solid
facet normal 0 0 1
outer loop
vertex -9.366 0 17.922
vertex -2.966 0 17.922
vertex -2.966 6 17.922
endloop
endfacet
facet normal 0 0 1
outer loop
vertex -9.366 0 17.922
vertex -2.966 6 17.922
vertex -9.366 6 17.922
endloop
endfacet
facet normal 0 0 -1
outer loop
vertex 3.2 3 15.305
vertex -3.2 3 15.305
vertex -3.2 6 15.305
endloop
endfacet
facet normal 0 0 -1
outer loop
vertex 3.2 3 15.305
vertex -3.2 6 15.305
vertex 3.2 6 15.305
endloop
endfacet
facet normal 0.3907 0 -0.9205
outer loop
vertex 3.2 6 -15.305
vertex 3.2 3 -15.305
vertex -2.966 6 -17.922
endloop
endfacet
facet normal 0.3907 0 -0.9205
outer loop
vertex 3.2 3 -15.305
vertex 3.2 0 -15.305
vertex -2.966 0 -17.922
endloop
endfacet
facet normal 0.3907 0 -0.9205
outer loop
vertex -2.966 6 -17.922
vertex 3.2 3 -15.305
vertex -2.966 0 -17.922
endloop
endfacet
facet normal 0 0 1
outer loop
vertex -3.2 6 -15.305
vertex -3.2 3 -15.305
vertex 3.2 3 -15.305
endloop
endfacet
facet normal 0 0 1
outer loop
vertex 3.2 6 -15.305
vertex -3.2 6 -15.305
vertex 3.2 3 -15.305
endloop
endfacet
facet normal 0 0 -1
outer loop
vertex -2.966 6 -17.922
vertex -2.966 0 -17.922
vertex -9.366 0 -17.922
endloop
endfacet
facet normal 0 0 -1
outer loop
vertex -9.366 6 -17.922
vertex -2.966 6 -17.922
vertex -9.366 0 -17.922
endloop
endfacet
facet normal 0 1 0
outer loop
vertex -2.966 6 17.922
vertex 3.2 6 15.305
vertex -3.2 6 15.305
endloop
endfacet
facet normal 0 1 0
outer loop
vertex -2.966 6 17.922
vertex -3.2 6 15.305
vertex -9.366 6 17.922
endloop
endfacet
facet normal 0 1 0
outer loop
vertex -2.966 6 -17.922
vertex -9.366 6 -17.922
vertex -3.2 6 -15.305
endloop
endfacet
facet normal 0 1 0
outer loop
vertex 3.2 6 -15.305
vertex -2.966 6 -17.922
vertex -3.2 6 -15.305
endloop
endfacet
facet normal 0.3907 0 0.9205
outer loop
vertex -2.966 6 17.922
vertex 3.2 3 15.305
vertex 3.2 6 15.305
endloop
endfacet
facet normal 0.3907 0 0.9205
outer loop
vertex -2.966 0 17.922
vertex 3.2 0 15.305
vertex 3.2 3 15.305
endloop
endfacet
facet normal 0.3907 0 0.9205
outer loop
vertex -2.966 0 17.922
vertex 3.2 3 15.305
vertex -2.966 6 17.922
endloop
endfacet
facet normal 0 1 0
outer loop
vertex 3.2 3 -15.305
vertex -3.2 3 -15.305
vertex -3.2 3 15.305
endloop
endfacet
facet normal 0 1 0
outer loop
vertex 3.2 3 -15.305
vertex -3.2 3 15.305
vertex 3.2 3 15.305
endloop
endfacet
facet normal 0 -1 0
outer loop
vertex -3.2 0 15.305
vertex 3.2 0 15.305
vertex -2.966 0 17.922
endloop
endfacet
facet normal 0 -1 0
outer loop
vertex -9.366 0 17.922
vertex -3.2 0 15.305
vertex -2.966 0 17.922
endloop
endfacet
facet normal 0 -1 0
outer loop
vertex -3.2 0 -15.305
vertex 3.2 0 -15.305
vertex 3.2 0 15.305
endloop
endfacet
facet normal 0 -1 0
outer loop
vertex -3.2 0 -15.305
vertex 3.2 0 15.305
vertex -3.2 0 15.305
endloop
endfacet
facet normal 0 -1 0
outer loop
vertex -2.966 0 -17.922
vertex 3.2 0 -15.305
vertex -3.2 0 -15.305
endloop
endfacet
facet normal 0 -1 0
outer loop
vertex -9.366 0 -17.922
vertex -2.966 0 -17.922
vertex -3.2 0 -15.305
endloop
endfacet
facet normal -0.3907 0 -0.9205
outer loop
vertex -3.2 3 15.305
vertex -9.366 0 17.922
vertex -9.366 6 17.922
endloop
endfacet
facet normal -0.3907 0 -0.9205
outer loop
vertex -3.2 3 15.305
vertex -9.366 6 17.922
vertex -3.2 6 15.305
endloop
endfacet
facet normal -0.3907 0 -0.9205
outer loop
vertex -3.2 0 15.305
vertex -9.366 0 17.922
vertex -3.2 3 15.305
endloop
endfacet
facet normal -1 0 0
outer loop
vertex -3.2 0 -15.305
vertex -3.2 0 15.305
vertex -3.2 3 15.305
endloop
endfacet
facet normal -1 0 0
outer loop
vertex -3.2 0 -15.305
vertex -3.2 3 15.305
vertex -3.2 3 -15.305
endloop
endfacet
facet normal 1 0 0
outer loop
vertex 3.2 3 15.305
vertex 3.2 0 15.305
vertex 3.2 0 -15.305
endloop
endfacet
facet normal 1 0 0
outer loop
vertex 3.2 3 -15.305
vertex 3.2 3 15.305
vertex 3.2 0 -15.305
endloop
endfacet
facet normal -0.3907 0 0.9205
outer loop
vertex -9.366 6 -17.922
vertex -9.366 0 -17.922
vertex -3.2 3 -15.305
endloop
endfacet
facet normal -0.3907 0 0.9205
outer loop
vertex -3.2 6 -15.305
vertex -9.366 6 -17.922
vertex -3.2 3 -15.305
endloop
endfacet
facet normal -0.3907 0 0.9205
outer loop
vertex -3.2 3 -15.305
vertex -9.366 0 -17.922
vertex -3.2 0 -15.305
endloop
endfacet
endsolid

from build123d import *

# Parameters (mm, degrees)
SKETCH1_W           = 6.4
SKETCH1_H           = 30.61
BOSS_EXTRUDE1_DEPTH = 3
BOSS_EXTRUDE2_DEPTH = 6


with BuildPart() as part:
    # Sketch1 → Boss-Extrude1 (new body)
    with BuildSketch(Plane(origin=(0, 0, 0), x_dir=(1, 0, 0), z_dir=(0, 1, 0))):
        Rectangle(SKETCH1_W, SKETCH1_H)
    extrude(amount=BOSS_EXTRUDE1_DEPTH)

    # Sketch1<3> → Boss-Extrude2 (add)
    with BuildSketch(Plane(origin=(0, 0, 0), x_dir=(1, 0, 0), z_dir=(0, 1, 0))):
        Polygon((-3.2, 15.305), (3.2, 15.305), (-2.966154938, 17.922377484), (-9.366154938, 17.922377484), align=None)
        Polygon((-2.966154938, -17.922377484), (3.2, -15.305), (-3.2, -15.305), (-9.366154938, -17.922377484), align=None)
    extrude(amount=BOSS_EXTRUDE2_DEPTH)


solid = part.part
